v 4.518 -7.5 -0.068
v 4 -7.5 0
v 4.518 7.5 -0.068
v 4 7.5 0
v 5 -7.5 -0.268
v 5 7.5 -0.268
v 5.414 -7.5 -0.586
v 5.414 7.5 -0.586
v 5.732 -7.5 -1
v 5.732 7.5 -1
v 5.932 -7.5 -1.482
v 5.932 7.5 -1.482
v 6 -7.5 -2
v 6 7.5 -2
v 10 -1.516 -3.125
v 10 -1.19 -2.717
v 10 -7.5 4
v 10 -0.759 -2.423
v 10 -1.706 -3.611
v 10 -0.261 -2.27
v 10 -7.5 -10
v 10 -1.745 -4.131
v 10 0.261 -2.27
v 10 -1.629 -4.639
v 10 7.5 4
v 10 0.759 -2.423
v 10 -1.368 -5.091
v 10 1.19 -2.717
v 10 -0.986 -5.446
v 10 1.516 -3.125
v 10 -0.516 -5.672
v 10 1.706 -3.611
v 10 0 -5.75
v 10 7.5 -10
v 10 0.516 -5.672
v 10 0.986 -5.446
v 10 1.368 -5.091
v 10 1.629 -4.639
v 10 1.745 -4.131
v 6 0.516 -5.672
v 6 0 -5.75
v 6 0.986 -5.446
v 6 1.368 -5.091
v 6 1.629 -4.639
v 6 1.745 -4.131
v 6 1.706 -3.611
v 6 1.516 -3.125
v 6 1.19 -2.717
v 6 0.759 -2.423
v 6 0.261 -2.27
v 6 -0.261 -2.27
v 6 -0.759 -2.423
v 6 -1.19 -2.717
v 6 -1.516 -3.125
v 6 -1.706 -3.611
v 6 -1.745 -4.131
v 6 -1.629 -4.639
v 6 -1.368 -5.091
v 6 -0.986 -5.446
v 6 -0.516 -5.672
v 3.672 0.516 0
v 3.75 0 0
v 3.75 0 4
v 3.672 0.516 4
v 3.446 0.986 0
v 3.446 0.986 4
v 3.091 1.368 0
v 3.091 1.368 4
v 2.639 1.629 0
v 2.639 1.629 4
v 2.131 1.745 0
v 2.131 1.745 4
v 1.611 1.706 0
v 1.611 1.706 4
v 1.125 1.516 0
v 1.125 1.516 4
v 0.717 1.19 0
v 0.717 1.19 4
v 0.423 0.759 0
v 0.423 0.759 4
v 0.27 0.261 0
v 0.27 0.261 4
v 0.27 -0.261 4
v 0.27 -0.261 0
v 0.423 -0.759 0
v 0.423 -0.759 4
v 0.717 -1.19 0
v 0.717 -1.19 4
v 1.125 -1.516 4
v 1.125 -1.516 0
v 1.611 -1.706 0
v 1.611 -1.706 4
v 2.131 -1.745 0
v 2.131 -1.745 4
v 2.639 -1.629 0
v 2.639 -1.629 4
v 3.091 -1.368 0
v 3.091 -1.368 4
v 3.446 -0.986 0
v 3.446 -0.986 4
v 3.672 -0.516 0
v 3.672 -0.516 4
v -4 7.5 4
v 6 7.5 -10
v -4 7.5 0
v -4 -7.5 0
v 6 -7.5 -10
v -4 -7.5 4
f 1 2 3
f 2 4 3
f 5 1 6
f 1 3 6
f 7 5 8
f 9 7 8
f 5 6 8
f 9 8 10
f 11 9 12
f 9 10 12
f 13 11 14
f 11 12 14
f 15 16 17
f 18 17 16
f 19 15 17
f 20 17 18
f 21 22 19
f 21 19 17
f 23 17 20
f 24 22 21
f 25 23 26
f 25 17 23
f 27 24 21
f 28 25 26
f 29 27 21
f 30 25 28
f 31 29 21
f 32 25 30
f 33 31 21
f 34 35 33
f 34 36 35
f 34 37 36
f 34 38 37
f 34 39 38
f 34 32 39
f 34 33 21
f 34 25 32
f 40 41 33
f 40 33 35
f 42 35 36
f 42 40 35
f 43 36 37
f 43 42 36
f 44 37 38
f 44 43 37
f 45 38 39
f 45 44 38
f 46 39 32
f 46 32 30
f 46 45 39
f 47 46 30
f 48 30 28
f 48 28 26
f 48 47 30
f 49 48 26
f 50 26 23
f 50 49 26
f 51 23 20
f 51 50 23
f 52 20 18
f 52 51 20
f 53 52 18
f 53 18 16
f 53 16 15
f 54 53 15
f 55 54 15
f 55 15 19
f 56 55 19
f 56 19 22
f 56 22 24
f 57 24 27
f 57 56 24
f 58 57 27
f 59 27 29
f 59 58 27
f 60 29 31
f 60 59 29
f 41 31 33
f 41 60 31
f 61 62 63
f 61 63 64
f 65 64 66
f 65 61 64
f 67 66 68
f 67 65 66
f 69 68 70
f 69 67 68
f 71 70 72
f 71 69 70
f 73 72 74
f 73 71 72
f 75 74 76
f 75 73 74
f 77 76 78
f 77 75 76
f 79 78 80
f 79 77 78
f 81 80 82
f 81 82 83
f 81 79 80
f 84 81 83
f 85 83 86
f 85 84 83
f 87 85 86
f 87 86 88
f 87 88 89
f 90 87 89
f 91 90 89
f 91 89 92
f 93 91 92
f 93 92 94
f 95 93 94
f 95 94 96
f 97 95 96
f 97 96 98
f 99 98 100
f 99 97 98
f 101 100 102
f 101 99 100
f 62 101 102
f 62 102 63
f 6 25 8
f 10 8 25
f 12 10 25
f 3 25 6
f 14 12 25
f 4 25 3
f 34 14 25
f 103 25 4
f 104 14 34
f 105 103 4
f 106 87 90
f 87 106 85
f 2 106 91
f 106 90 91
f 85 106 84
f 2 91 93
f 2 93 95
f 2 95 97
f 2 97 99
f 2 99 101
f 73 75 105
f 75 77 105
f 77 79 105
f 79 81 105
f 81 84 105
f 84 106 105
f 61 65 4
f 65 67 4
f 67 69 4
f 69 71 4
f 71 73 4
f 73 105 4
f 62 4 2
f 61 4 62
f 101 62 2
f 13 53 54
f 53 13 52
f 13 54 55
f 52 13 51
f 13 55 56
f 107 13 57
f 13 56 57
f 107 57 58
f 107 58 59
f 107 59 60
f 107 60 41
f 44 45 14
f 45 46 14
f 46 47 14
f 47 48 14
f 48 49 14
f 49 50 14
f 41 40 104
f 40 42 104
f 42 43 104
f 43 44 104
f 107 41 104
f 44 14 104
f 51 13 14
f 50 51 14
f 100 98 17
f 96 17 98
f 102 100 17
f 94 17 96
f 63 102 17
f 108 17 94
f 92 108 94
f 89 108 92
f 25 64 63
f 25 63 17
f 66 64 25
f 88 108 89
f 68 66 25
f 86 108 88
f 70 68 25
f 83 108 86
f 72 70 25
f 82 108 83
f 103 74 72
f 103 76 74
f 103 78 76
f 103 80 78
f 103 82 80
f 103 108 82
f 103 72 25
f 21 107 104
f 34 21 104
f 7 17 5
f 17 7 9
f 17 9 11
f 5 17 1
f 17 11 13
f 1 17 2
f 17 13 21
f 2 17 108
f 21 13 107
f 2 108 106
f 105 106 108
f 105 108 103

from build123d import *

# Parameters (mm, degrees)
SKETCH_1_W          = 12
SKETCH_1_H          = 15
SKETCH_1_R          = 1.75
EXTRUDE_1_DEPTH     = 4
SKETCH_2_W          = 16
SKETCH_2_H          = 15
SKETCH_2_R          = 1.75
EXTRUDE_2_DEPTH     = 4
FILLET_1_R          = 2
SKETCH_3_W          = 2
SKETCH_3_H          = 15
CUT_EXTRUDE_1_DEPTH = 4
SKETCH_4_W          = 2
SKETCH_4_H          = 15
CUT_EXTRUDE_2_DEPTH = 4


with BuildPart() as part:
    # 草图1 → 凸台-拉伸1 (new body)
    with BuildSketch(Plane.XY):
        Rectangle(SKETCH_1_W, SKETCH_1_H)
        with Locations((2, 0)):
            Circle(SKETCH_1_R, mode=Mode.SUBTRACT)
    extrude(amount=EXTRUDE_1_DEPTH)

    # 草图2 → 凸台-拉伸2 (add)
    with BuildSketch(Plane(origin=(6, 0, 0), x_dir=(0, 0, -1), z_dir=(1, 0, 0))):
        with Locations((4, 0)):
            Rectangle(SKETCH_2_W, SKETCH_2_H)
        with Locations((4, 0)):
            Circle(SKETCH_2_R, mode=Mode.SUBTRACT)
    extrude(amount=EXTRUDE_2_DEPTH)

    # 圆角1
    fillet_1_edges = [part.edges().sort_by_distance(p)[0] for p in [
        (6, 0, 0),
    ]]
    fillet(fillet_1_edges, radius=FILLET_1_R)

    # 草图3 → 切除-拉伸1 (cut)
    with BuildSketch(Plane.ZY.offset(-6)):
        with Locations((-11, 0)):
            Rectangle(SKETCH_3_W, SKETCH_3_H)
    extrude(amount=-CUT_EXTRUDE_1_DEPTH, mode=Mode.SUBTRACT)

    # 草图4 → 切除-拉伸2 (cut)
    with BuildSketch(Plane(origin=(0, 0, 0), x_dir=(-1, 0, 0), z_dir=(0, 0, -1))):
        with Locations((5, 0)):
            Rectangle(SKETCH_4_W, SKETCH_4_H)
    extrude(amount=-CUT_EXTRUDE_2_DEPTH, mode=Mode.SUBTRACT)


solid = part.part
